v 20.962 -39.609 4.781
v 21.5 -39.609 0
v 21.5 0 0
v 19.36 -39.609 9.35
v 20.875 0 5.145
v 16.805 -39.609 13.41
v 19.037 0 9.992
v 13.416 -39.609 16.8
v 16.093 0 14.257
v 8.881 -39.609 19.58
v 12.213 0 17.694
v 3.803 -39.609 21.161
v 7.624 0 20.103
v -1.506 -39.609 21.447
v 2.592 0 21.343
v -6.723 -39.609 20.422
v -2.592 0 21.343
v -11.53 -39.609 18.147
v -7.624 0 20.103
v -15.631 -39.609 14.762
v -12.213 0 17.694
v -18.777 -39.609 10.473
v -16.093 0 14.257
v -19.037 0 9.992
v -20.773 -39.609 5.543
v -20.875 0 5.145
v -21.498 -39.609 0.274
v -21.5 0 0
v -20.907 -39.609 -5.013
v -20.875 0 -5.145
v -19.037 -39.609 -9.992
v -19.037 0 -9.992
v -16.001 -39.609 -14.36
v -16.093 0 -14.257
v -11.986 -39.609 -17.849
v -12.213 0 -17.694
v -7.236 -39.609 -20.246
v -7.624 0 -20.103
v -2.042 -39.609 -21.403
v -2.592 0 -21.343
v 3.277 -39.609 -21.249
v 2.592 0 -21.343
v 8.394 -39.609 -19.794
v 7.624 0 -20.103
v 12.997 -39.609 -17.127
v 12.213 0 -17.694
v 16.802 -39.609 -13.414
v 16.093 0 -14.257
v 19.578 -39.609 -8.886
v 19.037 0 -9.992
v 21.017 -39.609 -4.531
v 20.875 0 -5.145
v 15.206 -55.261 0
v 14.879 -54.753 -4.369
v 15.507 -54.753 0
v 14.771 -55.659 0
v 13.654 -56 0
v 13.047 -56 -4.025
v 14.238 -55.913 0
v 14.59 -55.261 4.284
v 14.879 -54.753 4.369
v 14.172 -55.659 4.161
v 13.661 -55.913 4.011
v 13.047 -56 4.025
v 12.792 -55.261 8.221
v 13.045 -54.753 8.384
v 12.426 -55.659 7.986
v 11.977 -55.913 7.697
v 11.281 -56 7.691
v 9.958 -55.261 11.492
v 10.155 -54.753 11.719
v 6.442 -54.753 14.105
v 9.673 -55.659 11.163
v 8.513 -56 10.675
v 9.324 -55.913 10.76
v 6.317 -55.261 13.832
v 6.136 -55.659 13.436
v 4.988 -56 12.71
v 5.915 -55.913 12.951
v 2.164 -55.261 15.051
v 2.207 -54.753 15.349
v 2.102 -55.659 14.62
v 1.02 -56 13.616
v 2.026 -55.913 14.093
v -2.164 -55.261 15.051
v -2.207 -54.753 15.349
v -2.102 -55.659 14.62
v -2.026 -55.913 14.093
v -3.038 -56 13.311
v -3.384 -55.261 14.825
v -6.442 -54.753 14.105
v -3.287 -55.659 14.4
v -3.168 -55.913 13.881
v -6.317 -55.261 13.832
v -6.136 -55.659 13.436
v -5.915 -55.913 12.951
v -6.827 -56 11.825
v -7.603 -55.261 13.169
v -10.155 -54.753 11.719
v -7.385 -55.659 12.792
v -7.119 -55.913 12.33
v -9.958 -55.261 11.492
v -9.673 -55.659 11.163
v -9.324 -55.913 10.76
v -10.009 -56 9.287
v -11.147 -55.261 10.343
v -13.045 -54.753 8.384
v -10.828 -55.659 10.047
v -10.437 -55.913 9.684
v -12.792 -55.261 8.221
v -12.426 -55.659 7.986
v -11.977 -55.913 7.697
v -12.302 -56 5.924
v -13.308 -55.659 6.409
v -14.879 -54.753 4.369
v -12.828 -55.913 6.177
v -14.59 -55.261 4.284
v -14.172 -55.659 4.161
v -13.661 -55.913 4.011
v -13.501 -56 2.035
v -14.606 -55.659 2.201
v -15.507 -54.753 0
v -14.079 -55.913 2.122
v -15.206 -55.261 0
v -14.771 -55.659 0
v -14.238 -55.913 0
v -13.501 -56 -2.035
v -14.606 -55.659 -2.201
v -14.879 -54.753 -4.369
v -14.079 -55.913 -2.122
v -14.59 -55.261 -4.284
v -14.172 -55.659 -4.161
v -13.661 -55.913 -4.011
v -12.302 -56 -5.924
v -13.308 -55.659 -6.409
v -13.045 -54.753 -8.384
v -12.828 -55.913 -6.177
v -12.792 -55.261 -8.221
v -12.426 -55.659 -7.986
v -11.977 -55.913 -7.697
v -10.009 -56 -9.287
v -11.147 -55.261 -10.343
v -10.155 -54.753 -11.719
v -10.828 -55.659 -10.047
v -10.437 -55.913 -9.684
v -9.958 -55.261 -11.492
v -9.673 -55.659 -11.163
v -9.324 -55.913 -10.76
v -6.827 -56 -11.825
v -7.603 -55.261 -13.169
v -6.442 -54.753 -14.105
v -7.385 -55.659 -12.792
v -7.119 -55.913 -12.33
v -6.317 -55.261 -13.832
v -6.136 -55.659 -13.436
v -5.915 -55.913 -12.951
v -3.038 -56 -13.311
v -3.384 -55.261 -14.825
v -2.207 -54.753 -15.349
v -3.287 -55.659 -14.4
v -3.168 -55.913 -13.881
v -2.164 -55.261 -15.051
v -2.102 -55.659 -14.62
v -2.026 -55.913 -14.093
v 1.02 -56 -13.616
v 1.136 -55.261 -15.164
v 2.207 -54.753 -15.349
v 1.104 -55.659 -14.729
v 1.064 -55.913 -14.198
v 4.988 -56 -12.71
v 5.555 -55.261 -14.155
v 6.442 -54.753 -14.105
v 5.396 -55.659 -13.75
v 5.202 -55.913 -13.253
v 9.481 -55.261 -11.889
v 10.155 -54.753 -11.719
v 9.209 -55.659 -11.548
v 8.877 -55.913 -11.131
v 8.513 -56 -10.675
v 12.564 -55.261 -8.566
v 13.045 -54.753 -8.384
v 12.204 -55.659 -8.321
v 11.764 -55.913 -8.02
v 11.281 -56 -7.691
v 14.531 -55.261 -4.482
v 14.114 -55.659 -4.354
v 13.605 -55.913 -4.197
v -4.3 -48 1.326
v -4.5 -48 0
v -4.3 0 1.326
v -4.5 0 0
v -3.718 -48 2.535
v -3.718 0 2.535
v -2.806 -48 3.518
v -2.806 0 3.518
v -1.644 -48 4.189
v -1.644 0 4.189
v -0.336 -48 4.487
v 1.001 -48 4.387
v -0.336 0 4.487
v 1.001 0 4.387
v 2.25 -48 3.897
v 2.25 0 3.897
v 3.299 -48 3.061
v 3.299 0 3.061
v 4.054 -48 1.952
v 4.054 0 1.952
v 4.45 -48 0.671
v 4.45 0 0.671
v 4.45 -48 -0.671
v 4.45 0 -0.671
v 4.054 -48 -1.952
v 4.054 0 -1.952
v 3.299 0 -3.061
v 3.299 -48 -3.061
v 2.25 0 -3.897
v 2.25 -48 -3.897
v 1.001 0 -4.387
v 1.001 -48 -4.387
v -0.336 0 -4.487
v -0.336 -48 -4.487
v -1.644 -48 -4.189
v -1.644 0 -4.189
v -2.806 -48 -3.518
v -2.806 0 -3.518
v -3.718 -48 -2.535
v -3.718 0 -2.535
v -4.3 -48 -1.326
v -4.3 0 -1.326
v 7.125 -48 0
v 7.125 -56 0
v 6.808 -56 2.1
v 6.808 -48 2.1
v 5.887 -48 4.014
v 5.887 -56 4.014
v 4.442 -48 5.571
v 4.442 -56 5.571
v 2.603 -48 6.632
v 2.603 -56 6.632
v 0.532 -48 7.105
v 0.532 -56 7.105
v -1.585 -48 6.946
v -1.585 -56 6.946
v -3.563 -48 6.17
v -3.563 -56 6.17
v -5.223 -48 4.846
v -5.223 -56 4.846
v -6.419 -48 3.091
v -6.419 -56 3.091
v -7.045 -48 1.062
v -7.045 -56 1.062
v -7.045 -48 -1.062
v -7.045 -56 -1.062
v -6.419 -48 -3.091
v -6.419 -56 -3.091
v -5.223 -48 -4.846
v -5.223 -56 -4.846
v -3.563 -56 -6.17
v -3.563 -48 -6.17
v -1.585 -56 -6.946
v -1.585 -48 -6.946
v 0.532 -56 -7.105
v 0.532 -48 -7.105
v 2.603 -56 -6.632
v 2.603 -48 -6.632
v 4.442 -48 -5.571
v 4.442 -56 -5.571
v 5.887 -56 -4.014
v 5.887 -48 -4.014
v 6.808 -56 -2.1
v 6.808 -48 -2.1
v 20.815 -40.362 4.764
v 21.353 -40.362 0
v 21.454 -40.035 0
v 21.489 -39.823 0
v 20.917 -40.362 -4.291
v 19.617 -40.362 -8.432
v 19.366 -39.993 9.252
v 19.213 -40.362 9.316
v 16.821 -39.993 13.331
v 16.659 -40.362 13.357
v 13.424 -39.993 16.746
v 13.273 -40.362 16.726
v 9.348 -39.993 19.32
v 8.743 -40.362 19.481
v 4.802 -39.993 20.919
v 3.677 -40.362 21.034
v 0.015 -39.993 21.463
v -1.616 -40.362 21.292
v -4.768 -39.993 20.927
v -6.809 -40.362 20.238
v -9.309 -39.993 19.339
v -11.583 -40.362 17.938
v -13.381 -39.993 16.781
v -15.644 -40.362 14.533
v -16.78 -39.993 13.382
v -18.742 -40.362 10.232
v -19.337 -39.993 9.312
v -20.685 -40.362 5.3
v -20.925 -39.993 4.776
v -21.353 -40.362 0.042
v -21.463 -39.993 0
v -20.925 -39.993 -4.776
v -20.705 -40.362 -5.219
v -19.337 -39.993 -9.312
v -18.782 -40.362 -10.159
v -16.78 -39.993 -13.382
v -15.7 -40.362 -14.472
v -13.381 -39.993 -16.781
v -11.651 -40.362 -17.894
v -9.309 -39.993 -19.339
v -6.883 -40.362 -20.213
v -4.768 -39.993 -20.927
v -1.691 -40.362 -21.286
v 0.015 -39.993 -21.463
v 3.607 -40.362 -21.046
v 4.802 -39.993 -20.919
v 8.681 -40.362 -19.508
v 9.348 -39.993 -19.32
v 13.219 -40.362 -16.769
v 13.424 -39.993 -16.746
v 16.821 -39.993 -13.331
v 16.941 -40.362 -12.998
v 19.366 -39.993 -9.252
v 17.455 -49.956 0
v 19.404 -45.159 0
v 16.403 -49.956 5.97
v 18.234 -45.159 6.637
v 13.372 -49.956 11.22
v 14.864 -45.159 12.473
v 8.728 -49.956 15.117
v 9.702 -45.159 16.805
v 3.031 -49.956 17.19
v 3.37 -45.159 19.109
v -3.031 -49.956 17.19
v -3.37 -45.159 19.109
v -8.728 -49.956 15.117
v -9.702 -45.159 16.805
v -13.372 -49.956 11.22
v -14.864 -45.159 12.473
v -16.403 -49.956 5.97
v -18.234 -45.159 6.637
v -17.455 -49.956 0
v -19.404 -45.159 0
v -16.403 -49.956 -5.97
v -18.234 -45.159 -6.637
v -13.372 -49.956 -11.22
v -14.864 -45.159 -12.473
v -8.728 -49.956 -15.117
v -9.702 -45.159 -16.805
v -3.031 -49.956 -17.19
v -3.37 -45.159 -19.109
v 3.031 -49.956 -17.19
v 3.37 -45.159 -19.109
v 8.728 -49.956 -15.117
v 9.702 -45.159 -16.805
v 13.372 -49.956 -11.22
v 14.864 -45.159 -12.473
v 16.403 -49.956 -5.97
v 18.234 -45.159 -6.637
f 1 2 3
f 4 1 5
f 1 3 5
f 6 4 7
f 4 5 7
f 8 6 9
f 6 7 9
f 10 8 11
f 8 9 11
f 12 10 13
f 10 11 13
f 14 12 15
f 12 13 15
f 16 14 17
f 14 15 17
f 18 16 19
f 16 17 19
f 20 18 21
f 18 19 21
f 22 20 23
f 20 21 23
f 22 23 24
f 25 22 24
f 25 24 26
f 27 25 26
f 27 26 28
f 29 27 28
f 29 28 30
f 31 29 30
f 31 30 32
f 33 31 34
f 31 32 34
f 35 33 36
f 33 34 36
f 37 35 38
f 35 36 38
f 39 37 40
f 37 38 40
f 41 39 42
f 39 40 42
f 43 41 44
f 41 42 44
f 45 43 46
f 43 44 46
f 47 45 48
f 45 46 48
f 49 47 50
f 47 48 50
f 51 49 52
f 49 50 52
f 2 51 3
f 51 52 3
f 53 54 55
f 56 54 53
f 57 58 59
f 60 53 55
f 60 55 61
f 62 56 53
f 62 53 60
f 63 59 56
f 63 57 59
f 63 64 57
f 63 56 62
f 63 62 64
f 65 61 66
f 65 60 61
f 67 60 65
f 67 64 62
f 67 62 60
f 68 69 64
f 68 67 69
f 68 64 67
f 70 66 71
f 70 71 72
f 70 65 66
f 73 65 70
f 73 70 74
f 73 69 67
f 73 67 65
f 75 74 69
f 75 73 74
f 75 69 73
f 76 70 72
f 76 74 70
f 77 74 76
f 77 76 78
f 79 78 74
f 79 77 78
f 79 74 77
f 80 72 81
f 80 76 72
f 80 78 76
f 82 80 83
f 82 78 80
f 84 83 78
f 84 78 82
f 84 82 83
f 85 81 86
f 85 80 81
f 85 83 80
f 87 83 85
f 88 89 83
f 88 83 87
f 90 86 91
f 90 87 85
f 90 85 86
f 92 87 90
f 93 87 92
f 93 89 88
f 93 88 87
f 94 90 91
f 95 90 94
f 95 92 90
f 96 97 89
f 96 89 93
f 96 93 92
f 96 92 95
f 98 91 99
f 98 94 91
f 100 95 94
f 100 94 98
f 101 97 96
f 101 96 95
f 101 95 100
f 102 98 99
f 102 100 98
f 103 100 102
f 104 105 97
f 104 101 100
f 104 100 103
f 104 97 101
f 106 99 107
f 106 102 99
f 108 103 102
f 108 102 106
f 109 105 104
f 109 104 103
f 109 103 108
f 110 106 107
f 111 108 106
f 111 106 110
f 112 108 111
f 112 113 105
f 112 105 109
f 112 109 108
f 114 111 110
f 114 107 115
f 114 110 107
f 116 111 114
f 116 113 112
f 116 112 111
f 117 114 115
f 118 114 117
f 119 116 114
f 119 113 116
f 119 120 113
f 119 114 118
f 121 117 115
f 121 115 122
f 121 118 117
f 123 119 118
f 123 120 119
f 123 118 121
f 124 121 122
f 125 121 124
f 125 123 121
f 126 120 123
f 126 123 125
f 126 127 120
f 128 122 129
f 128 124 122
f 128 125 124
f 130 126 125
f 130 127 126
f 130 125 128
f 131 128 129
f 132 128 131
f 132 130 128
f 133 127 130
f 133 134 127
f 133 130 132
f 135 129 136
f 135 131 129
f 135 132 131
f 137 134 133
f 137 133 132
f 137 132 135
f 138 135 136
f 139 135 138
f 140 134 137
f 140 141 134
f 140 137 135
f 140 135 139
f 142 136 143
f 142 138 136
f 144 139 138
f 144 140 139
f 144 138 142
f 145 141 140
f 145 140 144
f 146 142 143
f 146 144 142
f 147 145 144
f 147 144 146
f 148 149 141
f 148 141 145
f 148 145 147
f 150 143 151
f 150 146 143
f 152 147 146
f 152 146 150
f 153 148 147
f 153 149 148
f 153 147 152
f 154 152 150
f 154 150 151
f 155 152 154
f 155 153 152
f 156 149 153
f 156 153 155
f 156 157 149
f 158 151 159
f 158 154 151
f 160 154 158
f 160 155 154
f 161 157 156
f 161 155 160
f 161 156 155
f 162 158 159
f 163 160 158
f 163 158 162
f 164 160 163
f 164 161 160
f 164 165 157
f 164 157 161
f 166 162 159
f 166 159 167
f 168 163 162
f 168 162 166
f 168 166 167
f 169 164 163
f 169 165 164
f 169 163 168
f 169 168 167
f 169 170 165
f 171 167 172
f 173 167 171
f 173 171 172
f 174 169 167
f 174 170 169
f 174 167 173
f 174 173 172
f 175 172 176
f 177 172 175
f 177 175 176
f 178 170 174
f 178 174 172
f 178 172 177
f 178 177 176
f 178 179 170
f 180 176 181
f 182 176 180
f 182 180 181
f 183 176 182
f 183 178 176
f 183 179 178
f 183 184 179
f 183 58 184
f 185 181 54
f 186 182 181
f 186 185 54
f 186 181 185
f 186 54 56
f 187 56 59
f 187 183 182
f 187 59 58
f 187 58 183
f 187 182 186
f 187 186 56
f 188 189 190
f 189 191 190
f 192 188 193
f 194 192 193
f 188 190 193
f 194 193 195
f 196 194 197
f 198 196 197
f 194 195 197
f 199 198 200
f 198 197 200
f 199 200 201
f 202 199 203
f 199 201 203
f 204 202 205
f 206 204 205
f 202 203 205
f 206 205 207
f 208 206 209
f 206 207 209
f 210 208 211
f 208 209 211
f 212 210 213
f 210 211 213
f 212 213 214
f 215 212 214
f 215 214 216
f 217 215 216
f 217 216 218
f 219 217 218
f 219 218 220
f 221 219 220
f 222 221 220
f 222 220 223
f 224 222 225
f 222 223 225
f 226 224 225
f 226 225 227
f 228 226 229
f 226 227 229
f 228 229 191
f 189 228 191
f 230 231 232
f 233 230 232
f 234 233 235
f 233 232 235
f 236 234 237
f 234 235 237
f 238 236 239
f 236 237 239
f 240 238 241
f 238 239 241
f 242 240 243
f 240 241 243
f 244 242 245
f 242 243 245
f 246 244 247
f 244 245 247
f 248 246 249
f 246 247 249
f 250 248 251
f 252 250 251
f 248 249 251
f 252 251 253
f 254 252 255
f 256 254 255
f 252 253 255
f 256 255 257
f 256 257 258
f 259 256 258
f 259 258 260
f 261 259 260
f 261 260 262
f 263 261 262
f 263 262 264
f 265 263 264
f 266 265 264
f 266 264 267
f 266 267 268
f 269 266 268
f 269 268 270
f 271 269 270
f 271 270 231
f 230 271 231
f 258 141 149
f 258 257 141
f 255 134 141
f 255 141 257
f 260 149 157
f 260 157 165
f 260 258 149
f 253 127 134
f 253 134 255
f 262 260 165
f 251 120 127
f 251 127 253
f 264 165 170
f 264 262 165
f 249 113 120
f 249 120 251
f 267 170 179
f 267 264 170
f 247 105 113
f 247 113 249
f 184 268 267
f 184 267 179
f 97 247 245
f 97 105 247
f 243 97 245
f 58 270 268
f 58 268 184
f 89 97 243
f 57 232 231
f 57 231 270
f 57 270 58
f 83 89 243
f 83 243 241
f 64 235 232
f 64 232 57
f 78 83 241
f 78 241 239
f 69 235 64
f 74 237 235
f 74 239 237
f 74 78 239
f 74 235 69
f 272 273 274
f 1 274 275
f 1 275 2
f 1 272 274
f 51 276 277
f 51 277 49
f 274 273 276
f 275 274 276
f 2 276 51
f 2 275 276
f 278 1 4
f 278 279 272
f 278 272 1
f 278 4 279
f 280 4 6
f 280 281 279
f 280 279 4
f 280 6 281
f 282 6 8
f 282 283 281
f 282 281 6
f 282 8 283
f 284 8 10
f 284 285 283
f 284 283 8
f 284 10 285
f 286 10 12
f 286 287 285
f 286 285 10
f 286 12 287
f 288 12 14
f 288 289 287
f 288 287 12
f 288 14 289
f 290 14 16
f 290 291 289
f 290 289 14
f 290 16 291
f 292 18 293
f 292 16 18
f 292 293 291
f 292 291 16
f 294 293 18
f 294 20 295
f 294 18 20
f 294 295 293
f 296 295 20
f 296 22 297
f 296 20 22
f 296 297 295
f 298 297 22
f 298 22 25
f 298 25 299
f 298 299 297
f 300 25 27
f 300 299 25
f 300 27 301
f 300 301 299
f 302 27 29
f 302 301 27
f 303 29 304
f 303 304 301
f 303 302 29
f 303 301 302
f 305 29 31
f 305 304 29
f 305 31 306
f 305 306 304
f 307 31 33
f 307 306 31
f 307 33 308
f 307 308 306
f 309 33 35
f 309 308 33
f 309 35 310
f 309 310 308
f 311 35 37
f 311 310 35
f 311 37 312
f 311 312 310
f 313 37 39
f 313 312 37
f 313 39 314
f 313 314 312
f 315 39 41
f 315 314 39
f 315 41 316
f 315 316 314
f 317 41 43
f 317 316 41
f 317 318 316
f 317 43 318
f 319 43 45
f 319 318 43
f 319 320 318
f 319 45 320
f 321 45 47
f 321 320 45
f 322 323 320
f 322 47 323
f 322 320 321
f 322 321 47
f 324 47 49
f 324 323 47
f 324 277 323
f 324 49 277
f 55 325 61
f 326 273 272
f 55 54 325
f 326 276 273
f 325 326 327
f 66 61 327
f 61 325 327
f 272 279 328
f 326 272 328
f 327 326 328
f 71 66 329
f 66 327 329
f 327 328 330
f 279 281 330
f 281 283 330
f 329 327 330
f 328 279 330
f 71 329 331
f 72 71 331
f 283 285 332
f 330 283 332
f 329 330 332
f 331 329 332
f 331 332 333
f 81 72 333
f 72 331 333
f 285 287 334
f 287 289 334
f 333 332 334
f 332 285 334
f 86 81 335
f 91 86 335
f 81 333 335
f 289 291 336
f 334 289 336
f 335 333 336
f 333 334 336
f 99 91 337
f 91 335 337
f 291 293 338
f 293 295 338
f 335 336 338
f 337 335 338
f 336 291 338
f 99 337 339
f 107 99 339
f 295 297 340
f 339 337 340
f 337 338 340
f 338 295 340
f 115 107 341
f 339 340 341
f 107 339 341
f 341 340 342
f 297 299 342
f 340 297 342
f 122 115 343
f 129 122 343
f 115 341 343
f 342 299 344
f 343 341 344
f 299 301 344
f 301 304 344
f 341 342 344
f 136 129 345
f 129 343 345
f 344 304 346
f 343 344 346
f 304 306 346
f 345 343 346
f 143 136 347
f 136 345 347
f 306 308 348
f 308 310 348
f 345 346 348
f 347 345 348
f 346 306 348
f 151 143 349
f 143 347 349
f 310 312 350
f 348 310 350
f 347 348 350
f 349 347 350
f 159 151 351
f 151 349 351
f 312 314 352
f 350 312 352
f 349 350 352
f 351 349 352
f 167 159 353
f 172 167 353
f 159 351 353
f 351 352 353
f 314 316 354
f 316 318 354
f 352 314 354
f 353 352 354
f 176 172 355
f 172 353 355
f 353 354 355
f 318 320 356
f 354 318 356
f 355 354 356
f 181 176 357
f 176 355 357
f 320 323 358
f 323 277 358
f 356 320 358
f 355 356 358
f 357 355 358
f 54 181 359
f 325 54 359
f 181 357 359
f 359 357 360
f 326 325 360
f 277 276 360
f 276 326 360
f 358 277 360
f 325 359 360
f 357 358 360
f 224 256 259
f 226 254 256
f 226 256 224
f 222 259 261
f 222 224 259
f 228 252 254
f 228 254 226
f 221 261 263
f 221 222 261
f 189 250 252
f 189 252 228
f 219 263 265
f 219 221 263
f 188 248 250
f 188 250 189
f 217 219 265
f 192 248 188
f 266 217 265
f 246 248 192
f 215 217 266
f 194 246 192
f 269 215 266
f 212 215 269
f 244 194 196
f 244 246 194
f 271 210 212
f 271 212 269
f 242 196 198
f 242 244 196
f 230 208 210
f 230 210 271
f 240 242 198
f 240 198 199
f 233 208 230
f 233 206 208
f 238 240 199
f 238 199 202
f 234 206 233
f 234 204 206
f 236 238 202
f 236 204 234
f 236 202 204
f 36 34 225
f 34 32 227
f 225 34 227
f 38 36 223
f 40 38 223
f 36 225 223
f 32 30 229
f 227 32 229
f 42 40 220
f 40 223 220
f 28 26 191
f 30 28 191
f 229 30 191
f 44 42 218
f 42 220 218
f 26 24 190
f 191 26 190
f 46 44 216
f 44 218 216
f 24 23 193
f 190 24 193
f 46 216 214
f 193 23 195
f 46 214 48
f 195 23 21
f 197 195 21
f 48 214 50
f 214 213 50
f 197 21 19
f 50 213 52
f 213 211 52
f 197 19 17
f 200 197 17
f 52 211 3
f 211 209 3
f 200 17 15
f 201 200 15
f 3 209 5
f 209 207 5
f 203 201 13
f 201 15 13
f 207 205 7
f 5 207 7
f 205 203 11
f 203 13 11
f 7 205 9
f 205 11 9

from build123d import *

# Parameters (mm, degrees)
F0_R           = 21.5
F1_DEPTH       = 40
F3_R           = 15
F1_FACE_R      = 21.5
F6_D           = 9
F6_CBORE_D     = 14.25
F6_CBORE_DEPTH = 8
F7_R           = 2


with BuildPart() as f1:
    # F0 (on Front) → F1 (new body)
    with BuildSketch(Plane.XZ):
        Circle(F0_R)
    extrude(amount=F1_DEPTH)

    # F3 (on offset) → F4 section 0
    with BuildSketch(Plane.XZ.offset(56)):
        Circle(F3_R)
    # F1_face (on face) → F4 section 1
    with BuildSketch(Plane.XZ.offset(40)):
        Circle(F1_FACE_R)
    loft()

    # F6 (through all)
    with Locations(Plane.XZ.offset(56)):
        with Locations((0, 0)):
            CounterBoreHole(F6_D / 2, F6_CBORE_D / 2, F6_CBORE_DEPTH)

    # F7
    f7_edges = [f1.edges().sort_by_distance(p)[0] for p in [
        (-21.5, -40, 0),
        (-15, -56, 0),
    ]]
    fillet(f7_edges, radius=F7_R)


solid = f1.part
